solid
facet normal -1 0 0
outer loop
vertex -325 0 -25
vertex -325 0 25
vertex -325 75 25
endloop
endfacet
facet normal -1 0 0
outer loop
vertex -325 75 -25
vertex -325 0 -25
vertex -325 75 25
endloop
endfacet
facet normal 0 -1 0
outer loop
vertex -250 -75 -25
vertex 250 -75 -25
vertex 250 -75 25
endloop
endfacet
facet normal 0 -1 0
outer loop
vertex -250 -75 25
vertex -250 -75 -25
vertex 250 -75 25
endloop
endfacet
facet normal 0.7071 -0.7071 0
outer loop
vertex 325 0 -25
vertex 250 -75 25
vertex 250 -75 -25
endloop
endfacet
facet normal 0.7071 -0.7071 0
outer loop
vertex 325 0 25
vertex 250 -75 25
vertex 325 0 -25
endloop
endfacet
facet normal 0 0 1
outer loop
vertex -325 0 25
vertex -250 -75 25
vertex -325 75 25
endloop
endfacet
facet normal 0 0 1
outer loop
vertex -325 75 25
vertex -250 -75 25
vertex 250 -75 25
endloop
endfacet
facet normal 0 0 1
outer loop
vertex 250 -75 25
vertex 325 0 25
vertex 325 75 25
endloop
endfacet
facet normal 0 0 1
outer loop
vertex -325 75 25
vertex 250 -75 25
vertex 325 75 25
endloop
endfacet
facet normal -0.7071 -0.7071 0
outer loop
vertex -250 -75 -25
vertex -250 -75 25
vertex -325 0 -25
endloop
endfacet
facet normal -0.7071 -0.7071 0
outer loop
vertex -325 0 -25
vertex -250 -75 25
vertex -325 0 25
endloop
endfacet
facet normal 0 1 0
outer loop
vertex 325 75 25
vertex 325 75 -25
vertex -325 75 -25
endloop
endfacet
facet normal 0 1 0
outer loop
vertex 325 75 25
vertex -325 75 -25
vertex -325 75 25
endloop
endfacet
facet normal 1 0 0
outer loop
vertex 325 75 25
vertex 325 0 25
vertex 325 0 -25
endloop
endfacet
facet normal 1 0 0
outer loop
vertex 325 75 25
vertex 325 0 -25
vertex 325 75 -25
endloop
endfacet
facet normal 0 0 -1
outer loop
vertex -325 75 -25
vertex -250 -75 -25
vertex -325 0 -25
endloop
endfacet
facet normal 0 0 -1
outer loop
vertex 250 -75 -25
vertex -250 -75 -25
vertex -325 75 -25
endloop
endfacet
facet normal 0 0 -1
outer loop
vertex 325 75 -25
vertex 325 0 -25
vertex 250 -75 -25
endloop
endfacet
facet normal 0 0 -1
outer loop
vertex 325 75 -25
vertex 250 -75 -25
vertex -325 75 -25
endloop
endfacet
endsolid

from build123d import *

# Parameters (mm, degrees)
F0_W     = 150
F0_H     = 50
F1_DEPTH = 325
F3_DEPTH = 50.001


# Not quite as in the source:
# - a pattern or mirror of a feature is missing from the dataset's text; its kind, count and spacing are read off the source's solid


with BuildPart() as f1:
    # F0 (on Right) → F1 (new body, symmetric)
    with BuildSketch(Plane.YZ):
        Rectangle(F0_W, F0_H)
    extrude(amount=F1_DEPTH, both=True)

    # F2 (on face) → F3 (cut, through all)
    with BuildSketch(Plane.XY.offset(25)):
        Polygon((-250, -75), (-325, 0), (-325, -75), align=None)
    f3 = extrude(amount=-F3_DEPTH, mode=Mode.SUBTRACT)

    # F3_copies: F3 across plane
    add(f3.mirror(Plane(origin=(0, 0, 0), x_dir=(0, 0, 1), z_dir=(1, 0, 0))), mode=Mode.SUBTRACT)


solid = f1.part
